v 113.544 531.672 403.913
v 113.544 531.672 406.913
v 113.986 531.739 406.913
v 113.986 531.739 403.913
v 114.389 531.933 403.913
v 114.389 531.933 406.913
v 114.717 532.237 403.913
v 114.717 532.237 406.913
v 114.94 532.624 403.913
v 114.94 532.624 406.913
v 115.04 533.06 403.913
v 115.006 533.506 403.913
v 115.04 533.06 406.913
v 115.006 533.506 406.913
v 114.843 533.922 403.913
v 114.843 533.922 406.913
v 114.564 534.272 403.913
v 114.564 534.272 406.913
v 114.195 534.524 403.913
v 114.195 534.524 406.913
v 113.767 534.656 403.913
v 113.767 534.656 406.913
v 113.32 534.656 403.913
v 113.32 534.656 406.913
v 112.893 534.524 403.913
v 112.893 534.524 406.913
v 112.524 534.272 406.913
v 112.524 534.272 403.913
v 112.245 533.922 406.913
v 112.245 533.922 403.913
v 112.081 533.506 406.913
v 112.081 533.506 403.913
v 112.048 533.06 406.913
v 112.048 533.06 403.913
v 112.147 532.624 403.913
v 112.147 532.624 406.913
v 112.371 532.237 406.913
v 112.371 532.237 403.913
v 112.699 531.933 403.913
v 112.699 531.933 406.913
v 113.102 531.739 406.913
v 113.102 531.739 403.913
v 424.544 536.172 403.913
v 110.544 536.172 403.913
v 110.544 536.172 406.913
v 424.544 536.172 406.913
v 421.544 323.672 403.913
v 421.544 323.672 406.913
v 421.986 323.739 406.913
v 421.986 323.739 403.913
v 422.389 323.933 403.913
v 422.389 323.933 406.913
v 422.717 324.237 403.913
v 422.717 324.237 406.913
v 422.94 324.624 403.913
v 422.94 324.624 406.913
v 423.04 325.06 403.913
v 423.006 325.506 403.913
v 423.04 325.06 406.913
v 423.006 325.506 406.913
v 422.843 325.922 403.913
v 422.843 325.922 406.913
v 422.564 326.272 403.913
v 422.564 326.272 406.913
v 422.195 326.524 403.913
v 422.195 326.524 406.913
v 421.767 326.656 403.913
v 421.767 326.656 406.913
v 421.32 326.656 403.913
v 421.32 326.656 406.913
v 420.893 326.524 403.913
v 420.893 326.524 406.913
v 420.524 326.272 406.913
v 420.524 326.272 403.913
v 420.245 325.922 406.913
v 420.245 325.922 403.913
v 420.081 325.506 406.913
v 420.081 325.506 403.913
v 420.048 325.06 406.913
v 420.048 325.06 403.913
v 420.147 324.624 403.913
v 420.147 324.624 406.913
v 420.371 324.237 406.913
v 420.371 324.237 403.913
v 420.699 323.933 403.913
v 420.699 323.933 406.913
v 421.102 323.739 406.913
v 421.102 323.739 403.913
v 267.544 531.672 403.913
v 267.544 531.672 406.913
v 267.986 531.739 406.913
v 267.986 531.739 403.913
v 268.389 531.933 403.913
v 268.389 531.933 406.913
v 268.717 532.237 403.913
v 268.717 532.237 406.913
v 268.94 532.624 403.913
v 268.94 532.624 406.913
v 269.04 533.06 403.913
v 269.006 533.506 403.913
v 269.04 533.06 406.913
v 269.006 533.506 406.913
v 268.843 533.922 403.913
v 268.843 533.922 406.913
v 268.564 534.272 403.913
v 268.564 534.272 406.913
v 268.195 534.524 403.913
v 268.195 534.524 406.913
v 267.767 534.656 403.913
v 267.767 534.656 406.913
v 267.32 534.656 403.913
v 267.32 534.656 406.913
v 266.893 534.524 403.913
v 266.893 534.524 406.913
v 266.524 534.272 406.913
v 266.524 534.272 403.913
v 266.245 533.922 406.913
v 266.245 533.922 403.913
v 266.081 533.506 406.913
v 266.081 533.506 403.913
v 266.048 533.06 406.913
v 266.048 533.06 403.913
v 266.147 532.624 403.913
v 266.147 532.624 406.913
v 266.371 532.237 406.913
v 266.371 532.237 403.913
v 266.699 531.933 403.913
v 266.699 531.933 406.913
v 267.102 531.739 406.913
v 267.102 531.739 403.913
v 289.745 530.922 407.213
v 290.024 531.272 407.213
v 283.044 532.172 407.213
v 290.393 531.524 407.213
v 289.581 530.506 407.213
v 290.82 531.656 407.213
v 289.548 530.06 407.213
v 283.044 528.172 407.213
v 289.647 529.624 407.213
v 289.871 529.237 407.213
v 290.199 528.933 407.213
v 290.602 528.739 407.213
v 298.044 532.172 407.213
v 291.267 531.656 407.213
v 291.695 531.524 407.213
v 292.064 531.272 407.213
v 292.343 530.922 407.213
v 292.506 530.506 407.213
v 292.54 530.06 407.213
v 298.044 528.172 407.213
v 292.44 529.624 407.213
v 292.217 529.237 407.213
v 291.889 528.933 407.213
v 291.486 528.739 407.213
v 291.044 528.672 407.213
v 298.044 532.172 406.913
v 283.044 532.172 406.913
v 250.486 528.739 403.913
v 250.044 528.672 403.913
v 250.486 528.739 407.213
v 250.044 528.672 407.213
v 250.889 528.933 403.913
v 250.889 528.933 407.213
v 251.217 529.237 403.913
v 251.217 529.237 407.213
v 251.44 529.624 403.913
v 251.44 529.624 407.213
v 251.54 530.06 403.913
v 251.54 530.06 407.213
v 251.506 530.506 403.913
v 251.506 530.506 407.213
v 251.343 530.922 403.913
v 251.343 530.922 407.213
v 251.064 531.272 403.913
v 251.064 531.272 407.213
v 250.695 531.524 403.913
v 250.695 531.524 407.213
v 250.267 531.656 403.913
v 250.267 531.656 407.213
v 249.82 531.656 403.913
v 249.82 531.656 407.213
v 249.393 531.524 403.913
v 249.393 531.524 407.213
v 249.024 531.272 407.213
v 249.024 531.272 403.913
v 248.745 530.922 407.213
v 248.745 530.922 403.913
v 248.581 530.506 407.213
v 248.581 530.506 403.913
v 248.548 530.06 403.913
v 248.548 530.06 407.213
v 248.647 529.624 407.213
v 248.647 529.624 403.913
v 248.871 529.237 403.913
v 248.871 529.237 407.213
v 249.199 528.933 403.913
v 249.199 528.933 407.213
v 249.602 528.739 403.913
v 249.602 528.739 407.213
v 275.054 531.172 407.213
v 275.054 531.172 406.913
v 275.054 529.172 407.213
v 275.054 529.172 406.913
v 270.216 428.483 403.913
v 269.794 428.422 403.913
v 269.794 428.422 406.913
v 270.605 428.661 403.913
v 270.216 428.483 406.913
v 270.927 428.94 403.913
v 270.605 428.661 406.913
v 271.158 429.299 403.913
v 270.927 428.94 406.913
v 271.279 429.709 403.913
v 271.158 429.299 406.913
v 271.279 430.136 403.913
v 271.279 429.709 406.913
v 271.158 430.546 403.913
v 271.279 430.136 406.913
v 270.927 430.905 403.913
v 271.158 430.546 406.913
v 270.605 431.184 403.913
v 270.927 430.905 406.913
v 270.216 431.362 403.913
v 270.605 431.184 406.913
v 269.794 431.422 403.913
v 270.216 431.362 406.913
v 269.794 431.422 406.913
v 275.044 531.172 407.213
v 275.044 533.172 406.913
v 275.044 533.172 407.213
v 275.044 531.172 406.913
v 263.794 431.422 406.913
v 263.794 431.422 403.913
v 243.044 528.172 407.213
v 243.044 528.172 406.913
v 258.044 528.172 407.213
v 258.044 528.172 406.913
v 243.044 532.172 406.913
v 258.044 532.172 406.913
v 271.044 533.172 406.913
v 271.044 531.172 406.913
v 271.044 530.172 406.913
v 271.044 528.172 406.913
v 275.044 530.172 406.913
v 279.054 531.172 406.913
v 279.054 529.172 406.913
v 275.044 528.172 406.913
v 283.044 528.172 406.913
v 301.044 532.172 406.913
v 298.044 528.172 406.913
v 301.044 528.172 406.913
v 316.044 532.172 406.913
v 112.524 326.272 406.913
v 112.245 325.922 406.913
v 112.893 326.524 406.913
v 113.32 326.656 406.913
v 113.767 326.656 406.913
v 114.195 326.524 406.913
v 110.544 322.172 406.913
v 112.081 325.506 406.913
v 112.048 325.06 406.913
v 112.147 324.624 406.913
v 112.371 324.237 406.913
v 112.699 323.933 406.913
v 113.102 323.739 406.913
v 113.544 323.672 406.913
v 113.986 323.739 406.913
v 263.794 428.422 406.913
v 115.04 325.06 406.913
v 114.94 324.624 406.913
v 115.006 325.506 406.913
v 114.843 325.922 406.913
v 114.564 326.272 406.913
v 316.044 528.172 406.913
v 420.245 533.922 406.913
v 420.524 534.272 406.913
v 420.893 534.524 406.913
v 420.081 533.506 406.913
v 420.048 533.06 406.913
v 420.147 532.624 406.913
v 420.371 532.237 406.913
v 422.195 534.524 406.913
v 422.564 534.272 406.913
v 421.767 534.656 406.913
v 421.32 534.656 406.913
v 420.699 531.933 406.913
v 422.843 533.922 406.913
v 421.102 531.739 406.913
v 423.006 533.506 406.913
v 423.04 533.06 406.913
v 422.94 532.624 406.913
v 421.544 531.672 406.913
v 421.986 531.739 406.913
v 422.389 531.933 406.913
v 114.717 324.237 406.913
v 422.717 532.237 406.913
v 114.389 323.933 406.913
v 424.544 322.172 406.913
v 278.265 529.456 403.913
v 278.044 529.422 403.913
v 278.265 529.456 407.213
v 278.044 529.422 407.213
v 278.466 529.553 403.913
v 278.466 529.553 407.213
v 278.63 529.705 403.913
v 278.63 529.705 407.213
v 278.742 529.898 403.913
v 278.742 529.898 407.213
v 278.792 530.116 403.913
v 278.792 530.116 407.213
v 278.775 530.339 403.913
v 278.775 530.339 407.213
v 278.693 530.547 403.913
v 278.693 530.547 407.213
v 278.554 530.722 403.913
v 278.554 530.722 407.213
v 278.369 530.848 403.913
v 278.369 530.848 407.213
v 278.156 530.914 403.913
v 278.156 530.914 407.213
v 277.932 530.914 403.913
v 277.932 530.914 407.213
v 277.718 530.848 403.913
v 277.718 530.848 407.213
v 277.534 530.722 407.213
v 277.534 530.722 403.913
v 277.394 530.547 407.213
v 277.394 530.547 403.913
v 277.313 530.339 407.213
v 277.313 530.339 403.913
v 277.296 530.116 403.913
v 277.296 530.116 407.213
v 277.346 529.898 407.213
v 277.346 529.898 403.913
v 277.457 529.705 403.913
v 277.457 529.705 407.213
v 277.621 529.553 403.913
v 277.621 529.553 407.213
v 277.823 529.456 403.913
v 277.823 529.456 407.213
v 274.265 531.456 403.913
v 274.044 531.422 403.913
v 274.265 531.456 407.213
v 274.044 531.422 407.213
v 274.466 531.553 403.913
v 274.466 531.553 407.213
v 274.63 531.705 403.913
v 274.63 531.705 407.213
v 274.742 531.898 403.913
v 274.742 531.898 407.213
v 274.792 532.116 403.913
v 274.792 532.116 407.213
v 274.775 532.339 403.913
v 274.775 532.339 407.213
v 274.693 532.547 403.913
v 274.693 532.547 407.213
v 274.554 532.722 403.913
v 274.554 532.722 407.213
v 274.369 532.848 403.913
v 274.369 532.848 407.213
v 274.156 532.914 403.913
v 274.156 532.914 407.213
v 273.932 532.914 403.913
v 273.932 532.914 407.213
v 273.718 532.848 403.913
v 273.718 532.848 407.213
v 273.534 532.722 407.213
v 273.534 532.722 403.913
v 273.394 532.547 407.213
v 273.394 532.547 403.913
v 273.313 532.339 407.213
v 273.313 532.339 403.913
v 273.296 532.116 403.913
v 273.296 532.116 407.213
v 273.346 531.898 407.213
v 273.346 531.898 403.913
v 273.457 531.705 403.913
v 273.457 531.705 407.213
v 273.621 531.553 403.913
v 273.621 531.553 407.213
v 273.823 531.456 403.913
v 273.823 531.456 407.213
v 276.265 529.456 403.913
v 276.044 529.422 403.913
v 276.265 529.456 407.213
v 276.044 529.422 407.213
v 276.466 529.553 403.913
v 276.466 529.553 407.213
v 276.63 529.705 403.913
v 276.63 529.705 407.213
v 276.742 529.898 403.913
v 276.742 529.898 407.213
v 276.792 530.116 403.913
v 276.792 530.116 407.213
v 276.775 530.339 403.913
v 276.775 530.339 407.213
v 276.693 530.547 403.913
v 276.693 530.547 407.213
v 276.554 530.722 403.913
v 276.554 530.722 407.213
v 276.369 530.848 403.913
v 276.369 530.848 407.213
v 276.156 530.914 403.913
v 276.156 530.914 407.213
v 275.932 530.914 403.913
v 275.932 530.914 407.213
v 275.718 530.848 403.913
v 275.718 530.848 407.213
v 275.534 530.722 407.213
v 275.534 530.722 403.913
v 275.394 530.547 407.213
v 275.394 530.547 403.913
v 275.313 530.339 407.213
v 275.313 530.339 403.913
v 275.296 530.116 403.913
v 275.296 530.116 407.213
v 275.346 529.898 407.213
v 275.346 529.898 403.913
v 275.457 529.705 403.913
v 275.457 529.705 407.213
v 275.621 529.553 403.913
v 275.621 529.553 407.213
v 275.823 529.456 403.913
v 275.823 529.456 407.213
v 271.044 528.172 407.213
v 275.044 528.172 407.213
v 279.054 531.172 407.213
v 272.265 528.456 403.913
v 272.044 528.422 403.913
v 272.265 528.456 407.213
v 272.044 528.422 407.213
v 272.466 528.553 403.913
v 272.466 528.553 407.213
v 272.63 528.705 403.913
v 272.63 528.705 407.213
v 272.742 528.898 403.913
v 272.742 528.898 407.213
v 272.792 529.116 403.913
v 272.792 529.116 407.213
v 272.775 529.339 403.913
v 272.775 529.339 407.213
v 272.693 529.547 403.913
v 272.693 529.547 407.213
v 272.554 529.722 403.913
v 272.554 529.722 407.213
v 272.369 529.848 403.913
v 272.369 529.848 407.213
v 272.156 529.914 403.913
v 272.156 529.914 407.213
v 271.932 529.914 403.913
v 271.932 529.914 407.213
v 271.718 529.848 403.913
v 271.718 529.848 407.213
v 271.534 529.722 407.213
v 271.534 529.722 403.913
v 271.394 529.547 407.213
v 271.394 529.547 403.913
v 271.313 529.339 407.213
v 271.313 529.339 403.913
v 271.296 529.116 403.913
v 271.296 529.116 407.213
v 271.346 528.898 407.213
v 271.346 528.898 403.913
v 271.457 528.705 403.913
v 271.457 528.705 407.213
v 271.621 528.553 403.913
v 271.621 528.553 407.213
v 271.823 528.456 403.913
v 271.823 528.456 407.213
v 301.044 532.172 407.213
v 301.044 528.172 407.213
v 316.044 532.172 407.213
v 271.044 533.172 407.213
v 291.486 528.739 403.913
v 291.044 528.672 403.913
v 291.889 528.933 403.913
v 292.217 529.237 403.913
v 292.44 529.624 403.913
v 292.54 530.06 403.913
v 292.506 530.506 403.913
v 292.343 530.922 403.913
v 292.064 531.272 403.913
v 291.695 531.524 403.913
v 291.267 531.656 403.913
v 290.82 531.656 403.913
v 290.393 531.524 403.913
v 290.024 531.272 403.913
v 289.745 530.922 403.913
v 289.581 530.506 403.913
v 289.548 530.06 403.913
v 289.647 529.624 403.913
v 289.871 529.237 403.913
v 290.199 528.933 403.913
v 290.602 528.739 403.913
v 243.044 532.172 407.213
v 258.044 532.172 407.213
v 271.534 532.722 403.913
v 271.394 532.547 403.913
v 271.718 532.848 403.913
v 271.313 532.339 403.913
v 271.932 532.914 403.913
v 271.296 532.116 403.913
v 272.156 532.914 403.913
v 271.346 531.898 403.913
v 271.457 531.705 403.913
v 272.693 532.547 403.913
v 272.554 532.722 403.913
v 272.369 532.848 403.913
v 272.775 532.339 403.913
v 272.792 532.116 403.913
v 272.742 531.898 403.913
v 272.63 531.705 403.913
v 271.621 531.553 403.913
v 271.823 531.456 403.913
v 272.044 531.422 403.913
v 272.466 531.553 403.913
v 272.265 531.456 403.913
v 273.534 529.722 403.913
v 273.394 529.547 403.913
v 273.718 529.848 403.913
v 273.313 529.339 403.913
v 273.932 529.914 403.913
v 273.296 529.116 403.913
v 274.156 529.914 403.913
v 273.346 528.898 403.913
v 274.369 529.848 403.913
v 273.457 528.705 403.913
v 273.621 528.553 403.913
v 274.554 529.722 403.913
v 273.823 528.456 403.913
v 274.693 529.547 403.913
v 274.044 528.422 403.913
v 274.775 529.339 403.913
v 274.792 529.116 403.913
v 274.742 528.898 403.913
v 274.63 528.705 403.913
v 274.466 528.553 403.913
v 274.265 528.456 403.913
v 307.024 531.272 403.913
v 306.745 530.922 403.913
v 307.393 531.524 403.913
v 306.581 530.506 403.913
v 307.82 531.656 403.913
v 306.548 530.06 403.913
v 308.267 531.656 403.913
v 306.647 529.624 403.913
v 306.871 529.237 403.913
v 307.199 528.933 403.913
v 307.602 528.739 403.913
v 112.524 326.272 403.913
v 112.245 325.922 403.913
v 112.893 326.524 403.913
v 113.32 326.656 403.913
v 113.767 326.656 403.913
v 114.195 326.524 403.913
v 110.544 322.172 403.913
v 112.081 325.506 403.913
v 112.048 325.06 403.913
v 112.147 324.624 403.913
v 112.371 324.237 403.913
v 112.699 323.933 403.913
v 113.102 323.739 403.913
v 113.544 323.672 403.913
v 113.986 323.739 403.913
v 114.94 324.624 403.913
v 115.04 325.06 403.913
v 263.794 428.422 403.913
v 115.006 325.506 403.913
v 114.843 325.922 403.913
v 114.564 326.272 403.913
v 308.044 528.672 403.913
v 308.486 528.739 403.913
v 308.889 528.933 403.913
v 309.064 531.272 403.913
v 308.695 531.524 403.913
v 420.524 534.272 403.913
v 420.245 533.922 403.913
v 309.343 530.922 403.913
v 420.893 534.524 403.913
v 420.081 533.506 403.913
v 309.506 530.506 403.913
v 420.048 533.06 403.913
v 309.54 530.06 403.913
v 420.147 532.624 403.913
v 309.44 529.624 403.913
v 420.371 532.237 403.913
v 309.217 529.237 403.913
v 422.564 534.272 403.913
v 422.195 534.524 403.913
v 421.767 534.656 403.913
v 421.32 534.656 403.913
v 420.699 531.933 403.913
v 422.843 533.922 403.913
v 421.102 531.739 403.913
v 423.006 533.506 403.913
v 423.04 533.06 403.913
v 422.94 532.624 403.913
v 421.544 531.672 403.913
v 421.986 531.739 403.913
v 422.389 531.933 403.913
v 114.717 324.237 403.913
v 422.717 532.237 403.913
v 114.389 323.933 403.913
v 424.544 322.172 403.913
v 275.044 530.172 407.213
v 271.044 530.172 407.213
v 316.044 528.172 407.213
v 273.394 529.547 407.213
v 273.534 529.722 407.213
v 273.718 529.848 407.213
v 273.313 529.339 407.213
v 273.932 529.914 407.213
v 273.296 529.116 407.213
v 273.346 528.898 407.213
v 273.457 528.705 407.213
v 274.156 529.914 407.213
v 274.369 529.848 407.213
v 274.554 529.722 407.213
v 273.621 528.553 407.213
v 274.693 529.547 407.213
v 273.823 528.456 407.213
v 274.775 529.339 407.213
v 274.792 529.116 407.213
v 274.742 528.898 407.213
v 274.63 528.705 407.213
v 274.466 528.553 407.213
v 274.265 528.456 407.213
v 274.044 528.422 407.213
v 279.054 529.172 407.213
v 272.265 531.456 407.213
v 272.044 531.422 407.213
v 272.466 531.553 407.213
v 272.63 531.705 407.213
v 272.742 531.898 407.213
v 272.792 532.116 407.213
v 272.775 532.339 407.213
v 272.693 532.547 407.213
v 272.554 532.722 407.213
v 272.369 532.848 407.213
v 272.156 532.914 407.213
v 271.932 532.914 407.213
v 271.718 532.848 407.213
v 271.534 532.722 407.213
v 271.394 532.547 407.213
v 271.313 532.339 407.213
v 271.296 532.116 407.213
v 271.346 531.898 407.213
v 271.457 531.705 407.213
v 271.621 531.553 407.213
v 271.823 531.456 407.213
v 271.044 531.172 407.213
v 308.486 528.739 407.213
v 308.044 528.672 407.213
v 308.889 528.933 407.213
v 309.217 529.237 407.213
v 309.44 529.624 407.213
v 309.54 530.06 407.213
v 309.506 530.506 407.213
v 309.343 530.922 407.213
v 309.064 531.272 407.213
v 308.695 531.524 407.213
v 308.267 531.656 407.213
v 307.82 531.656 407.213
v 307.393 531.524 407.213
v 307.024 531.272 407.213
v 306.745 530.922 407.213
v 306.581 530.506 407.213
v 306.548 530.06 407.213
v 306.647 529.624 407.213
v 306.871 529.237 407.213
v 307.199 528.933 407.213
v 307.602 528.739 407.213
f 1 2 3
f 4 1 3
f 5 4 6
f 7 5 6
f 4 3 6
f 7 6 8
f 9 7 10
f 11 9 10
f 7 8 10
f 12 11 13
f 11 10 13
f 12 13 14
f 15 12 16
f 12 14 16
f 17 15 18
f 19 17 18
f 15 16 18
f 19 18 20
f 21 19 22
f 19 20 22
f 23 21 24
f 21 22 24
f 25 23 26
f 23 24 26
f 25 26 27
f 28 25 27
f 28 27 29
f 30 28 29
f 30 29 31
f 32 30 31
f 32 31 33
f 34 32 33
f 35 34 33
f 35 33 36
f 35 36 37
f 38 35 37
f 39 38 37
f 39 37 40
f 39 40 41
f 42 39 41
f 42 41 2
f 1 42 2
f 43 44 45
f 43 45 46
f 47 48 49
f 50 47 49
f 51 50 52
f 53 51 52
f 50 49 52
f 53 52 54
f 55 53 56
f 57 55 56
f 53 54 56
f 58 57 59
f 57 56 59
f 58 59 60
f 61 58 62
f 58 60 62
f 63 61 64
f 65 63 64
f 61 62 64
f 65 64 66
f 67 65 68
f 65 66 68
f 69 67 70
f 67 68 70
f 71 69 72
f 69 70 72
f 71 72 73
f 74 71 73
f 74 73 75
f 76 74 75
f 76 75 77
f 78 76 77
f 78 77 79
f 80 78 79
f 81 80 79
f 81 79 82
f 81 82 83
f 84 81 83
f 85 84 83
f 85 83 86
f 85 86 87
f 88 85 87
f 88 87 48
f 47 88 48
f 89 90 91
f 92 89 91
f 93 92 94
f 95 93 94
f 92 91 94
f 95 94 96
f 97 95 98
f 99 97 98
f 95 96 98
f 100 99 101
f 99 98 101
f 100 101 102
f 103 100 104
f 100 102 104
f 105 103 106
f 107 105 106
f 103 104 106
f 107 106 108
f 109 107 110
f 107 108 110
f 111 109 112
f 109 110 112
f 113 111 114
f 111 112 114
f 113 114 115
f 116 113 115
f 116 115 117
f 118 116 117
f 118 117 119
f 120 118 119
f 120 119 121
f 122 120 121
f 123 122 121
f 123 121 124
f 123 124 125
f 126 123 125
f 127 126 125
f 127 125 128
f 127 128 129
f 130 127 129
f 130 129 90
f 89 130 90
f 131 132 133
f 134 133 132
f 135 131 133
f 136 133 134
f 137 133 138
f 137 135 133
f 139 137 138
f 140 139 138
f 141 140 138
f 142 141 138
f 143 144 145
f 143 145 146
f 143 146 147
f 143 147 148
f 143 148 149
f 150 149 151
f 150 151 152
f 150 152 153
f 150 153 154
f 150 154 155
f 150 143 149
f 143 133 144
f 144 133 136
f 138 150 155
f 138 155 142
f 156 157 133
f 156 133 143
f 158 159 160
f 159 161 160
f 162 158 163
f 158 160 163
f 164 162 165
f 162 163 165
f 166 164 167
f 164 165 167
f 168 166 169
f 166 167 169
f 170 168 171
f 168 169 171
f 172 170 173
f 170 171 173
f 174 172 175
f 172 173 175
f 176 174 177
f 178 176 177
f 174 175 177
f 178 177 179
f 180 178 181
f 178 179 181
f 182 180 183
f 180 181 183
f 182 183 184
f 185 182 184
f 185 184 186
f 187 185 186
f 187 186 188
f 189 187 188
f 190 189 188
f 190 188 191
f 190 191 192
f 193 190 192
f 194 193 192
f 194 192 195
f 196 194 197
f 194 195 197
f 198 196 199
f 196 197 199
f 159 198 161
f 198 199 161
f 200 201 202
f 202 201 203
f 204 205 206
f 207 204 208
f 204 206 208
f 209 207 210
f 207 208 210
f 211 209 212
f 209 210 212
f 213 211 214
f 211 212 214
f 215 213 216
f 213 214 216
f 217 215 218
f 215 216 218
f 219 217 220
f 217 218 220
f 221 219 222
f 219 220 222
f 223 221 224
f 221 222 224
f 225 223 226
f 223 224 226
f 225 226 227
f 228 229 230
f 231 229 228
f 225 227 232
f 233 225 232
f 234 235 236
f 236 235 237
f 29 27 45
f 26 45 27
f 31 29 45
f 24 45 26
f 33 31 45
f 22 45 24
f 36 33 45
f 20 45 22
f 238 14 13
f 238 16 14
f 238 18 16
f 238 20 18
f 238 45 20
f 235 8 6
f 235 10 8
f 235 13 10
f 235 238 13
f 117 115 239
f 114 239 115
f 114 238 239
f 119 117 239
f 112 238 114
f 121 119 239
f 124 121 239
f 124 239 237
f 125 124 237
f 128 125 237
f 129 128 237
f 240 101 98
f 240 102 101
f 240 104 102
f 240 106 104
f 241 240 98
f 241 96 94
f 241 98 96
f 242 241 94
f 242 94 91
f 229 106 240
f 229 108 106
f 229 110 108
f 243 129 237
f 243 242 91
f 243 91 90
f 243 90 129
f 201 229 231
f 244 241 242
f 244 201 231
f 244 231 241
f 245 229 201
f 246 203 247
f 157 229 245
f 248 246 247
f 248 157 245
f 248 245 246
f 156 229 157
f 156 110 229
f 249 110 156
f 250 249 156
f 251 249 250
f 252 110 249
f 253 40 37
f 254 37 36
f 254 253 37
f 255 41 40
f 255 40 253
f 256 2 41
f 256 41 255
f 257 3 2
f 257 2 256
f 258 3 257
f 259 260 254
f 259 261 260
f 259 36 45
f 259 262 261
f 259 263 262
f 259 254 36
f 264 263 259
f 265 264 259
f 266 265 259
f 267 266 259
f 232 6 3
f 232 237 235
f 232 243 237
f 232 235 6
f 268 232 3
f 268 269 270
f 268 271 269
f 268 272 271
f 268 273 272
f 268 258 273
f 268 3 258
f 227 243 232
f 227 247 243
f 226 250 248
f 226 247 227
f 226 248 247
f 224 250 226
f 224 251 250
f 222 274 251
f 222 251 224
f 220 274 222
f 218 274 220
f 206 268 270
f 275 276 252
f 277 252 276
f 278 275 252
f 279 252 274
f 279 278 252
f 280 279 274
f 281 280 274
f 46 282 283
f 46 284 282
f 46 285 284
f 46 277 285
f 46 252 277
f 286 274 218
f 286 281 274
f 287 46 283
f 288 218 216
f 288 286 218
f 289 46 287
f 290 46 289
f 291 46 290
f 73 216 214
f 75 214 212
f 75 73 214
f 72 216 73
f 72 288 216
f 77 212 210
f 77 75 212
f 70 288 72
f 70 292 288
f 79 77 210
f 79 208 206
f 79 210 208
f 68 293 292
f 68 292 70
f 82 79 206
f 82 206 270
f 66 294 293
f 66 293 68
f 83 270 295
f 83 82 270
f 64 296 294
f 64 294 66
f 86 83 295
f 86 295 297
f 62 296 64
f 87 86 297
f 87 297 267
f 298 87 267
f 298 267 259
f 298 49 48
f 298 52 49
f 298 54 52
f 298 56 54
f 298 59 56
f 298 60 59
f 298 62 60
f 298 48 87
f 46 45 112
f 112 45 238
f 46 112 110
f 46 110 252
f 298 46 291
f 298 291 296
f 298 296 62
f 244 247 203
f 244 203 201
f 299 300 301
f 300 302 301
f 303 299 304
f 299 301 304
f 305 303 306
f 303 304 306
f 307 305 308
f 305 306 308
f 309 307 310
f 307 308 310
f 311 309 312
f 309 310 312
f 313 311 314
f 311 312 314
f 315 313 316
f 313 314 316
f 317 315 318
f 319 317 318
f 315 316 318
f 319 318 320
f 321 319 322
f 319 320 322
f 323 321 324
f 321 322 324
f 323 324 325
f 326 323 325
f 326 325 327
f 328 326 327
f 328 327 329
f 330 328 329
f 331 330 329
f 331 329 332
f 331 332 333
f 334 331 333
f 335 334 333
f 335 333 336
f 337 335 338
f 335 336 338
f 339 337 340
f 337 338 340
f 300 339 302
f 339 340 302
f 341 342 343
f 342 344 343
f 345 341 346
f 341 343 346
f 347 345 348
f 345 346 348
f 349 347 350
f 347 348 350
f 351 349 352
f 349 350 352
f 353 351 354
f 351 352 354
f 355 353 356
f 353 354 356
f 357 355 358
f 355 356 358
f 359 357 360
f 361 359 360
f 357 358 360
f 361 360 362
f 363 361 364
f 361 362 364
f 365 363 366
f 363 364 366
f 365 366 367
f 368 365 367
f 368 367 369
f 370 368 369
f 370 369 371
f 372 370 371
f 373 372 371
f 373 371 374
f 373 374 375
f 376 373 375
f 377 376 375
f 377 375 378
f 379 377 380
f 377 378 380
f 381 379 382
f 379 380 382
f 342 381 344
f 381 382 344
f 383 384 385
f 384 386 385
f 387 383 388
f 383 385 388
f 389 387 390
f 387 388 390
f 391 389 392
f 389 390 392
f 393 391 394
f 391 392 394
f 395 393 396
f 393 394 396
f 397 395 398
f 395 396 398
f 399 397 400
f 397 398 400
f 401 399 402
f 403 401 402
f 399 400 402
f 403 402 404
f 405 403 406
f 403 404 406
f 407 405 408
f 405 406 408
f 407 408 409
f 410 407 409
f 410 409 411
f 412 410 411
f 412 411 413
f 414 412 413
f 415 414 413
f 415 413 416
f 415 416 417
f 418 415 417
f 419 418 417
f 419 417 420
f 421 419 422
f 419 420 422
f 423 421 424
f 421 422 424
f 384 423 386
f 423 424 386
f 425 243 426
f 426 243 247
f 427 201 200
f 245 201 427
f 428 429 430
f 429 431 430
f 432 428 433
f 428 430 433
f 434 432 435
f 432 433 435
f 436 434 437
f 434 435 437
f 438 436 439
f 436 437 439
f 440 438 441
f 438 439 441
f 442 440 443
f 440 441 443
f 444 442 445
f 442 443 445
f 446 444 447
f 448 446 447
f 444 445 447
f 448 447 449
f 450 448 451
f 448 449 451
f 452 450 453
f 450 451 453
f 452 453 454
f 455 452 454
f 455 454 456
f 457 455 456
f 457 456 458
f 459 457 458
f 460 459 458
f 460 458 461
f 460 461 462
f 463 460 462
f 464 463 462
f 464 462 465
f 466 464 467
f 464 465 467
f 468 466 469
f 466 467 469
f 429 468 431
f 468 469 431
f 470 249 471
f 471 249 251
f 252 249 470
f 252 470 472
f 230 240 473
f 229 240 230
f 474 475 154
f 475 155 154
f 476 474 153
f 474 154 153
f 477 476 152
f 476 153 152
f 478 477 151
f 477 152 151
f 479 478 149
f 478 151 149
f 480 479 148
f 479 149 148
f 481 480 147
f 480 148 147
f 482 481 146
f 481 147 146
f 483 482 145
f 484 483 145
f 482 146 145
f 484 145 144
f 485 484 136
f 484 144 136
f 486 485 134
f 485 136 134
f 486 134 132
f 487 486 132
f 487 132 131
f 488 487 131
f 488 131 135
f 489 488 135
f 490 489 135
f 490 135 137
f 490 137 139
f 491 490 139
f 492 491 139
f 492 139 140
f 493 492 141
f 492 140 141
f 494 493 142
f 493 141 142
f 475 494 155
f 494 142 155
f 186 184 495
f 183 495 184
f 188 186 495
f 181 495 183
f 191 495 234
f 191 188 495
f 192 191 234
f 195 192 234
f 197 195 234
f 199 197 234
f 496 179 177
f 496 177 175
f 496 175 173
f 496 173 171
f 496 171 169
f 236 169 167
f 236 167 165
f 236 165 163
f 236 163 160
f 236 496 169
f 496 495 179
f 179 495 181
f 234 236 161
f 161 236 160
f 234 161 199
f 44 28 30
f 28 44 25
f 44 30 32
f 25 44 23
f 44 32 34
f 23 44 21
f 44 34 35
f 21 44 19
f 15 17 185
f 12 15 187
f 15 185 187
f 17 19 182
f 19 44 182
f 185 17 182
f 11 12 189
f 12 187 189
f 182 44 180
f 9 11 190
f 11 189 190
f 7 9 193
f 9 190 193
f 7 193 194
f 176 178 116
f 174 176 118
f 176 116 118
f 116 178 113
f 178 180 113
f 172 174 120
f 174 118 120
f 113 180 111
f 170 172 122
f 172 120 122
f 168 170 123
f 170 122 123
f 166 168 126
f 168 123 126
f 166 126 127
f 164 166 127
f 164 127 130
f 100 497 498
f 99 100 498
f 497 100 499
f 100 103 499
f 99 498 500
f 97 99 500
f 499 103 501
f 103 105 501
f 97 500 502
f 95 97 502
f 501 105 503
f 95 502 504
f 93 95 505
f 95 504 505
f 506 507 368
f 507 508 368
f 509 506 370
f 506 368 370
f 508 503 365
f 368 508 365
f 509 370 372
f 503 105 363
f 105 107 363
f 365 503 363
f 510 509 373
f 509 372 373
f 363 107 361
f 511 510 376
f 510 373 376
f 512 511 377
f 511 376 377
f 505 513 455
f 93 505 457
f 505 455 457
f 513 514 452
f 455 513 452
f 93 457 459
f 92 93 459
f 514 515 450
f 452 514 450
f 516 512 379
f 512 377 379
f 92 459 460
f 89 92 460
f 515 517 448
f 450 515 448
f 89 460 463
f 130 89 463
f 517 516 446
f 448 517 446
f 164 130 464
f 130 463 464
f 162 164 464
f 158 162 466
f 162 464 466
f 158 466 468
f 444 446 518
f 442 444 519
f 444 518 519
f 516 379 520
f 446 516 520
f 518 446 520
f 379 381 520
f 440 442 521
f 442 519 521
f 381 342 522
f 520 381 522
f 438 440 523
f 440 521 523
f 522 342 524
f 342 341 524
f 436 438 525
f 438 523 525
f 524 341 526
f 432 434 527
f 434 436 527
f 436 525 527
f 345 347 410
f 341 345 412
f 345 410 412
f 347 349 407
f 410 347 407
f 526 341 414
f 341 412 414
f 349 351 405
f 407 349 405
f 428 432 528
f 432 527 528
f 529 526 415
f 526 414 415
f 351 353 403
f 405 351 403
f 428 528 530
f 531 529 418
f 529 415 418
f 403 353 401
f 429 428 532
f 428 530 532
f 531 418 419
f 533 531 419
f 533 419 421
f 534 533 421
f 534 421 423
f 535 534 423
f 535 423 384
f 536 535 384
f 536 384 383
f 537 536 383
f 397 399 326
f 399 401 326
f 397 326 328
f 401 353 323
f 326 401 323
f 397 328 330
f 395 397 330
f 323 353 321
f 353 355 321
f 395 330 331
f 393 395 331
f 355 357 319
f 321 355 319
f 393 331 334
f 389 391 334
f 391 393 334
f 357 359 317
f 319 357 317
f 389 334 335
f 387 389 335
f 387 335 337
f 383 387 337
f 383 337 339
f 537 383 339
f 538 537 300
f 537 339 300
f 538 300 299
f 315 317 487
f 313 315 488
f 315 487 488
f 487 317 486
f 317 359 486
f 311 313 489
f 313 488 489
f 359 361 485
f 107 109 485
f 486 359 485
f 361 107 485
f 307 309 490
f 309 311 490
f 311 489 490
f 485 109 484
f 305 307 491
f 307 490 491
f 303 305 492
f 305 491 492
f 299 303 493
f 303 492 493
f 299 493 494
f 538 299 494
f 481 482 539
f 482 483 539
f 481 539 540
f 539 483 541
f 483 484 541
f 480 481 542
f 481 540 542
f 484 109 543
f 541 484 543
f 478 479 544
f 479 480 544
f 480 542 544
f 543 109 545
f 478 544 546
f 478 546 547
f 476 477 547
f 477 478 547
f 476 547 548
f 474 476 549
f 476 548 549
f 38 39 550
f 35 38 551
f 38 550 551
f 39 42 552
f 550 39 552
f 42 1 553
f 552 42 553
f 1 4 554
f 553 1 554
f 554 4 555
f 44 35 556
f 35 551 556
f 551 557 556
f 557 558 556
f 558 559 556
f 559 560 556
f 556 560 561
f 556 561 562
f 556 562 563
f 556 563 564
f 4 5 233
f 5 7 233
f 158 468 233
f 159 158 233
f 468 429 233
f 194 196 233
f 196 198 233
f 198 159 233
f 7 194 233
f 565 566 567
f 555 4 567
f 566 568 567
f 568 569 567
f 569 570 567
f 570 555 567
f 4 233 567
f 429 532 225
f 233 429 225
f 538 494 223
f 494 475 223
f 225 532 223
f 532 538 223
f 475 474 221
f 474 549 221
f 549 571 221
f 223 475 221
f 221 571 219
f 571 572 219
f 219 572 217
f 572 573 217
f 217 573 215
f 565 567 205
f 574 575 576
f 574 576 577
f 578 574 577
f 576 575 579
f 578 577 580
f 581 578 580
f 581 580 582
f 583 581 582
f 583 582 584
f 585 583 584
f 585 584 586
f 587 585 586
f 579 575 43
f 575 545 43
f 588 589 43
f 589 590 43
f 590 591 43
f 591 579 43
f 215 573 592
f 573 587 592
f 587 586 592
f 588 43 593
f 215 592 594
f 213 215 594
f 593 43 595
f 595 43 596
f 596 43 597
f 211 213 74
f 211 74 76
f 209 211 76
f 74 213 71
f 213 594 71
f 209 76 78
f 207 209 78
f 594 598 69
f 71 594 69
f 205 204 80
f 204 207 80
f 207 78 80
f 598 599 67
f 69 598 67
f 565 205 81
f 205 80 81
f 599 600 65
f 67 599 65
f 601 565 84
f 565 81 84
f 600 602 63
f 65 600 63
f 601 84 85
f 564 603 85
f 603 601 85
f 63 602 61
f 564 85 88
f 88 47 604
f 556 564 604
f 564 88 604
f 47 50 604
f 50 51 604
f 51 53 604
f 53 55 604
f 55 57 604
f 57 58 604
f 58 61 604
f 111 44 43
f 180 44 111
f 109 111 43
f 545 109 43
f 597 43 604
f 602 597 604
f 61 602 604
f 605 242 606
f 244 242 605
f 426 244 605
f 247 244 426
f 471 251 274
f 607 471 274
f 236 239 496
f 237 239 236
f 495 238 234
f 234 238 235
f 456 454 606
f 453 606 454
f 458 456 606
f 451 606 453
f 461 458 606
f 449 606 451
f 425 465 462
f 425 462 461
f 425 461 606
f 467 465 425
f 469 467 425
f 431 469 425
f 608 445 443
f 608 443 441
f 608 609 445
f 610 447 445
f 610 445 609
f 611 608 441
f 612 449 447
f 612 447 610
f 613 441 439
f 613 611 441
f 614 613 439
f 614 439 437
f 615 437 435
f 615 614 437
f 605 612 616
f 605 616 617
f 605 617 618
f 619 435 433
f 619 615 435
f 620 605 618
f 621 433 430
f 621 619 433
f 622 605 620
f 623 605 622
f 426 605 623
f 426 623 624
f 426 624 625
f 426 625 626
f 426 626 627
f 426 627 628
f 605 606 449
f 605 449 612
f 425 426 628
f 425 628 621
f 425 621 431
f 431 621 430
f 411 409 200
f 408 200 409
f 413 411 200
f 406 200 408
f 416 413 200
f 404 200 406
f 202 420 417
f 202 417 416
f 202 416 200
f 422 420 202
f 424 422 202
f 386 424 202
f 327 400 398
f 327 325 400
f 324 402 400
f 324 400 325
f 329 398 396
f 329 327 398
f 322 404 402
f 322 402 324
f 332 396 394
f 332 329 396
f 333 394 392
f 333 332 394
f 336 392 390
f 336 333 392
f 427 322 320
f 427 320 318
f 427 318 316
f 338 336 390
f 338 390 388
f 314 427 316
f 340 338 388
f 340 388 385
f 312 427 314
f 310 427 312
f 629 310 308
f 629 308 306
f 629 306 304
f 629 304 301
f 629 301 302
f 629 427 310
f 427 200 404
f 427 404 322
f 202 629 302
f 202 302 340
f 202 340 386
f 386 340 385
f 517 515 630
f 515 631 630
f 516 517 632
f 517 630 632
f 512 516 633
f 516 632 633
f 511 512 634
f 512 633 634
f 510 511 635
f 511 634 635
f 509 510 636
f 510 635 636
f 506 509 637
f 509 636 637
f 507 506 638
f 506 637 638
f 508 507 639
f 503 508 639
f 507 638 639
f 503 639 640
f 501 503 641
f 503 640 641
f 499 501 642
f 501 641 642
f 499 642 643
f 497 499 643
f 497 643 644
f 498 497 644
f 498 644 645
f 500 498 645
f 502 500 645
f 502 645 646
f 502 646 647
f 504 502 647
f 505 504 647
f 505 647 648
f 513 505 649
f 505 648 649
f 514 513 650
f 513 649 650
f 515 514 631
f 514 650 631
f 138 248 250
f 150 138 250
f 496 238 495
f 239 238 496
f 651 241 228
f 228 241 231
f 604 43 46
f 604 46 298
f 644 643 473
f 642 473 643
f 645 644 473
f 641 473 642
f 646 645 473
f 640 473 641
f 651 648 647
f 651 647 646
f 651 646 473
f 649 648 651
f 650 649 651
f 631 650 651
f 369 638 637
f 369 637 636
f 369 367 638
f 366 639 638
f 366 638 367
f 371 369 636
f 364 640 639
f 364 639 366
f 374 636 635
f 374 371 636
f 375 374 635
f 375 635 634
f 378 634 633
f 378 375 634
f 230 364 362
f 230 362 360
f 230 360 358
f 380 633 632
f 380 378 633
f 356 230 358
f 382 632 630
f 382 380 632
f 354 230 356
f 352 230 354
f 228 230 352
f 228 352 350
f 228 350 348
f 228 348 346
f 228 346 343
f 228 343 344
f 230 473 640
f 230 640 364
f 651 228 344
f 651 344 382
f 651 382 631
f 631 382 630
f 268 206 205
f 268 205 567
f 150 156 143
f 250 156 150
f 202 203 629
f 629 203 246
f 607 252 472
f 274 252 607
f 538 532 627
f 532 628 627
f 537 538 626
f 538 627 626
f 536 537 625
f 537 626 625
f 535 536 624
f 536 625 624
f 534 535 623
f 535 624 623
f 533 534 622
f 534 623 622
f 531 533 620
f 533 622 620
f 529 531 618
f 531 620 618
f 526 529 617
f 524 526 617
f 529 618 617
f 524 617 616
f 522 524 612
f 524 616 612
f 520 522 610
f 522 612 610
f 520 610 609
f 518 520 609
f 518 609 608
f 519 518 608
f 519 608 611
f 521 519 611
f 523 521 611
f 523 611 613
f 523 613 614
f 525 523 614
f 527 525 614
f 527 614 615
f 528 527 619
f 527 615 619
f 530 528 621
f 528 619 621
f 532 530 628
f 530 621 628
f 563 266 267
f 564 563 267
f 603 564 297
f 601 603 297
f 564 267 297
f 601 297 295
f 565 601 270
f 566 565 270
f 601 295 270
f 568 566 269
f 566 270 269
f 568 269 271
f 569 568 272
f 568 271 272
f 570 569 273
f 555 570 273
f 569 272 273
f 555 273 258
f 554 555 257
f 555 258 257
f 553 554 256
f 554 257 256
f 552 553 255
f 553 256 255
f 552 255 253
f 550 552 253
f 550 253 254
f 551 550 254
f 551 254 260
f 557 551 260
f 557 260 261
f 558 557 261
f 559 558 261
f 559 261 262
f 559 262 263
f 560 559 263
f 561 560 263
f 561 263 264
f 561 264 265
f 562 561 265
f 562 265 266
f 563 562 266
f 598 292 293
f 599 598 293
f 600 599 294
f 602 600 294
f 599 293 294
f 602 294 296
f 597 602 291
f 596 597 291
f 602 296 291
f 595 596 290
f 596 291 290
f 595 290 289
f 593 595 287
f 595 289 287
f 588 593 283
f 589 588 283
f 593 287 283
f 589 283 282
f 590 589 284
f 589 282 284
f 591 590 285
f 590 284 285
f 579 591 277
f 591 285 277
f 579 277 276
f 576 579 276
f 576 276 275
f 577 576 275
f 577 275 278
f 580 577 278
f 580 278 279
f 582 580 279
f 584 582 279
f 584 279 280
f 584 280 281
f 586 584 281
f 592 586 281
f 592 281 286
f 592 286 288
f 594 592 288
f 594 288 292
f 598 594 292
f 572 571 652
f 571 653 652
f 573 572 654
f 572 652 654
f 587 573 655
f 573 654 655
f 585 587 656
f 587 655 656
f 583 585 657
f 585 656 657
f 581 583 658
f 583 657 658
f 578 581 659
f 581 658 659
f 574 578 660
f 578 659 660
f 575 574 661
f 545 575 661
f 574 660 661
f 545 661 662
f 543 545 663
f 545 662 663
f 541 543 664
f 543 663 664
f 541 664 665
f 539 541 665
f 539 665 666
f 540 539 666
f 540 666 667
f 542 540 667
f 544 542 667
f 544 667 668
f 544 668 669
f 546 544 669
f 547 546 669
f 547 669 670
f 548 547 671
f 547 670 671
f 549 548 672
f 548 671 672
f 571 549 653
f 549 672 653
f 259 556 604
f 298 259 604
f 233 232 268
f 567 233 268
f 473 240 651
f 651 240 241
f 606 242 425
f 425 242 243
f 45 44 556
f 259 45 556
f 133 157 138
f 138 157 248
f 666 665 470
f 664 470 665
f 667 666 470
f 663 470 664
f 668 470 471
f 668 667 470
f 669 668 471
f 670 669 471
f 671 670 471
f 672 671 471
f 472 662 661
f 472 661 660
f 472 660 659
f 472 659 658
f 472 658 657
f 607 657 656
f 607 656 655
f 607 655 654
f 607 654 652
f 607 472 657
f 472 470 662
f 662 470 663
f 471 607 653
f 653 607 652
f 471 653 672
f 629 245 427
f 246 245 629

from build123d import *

# Parameters (mm, degrees)
SKETCH001_W       = 214
SKETCH001_H       = 314
PAD_DEPTH         = 3
SKETCH_W          = 4
SKETCH_H          = 15
SKETCH_W_2        = 2
SKETCH_H_2        = 4
PAD001_DEPTH      = 0.3
SKETCH002_R       = 1.5
SKETCH002_R_2     = 0.75
POCKET_DEPTH      = 3.001
POCKET_DEPTH_BACK = -0.301


with BuildPart() as part:
    # Sketch001 → Pad (new body)
    with BuildSketch(Plane(origin=(110.543777, 322.172485, 403.912964), x_dir=(0, -1, 0), z_dir=(0, 0, 1))):
        with Locations((-107, 157)):
            Rectangle(SKETCH001_W, SKETCH001_H)
    extrude(amount=PAD_DEPTH)

    # Sketch → Pad001 (new body)
    with BuildSketch(Plane(origin=(110.543777, 322.172485, 406.912964), x_dir=(0, -1, 0), z_dir=(0, 0, 1))):
        with Locations((-208, 140)):
            Rectangle(SKETCH_W, SKETCH_H)
        with Locations((-208, 180)):
            Rectangle(SKETCH_W, SKETCH_H)
        with Locations((-208, 198)):
            Rectangle(SKETCH_W, SKETCH_H)
        with Locations((-210, 162.5)):
            Rectangle(SKETCH_W_2, SKETCH_H_2)
        with Locations((-207, 162.5)):
            Rectangle(SKETCH_W_2, SKETCH_H_2)
        with Locations((-208, 166.51)):
            Rectangle(SKETCH_W_2, SKETCH_H_2)
    extrude(amount=PAD001_DEPTH)

    # Sketch002 → Pocket (cut, two sides)
    with BuildSketch(Plane(origin=(110.543777, 322.172485, 406.912964), x_dir=(0, -1, 0), z_dir=(0, 0, 1))) as pocket_sk:
        with Locations((-208, 139.5)):
            Circle(SKETCH002_R)
        with Locations((-211, 157)):
            Circle(SKETCH002_R)
        with Locations((-210, 161.5)):
            Circle(SKETCH002_R_2)
        with Locations((-210, 163.5)):
            Circle(SKETCH002_R_2)
        with Locations((-207, 161.5)):
            Circle(SKETCH002_R_2)
        with Locations((-207, 163.5)):
            Circle(SKETCH002_R_2)
        with Locations((-208, 167.5)):
            Circle(SKETCH002_R_2)
        with Locations((-208, 165.5)):
            Circle(SKETCH002_R_2)
        with Locations((-208, 180.5)):
            Circle(SKETCH002_R)
        with Locations((-208, 197.5)):
            Circle(SKETCH002_R)
        with Locations((-211, 311)):
            Circle(SKETCH002_R)
        with Locations((-211, 3)):
            Circle(SKETCH002_R)
        with Locations((-3, 3)):
            Circle(SKETCH002_R)
        with Locations((-3, 311)):
            Circle(SKETCH002_R)
        with BuildLine():
            Line((-109.25, 159.250001), (-109.25, 153.25))
            Line((-109.25, 153.25), (-106.25, 153.25))
            Line((-106.25, 159.25), (-106.25, 153.25))
            ThreePointArc((-106.25, 159.25), (-107.75, 160.749999), (-109.25, 159.250001))
        make_face()
    extrude(amount=-POCKET_DEPTH, mode=Mode.SUBTRACT)
    extrude(pocket_sk.sketch, amount=-POCKET_DEPTH_BACK, mode=Mode.SUBTRACT)


solid = part.part
